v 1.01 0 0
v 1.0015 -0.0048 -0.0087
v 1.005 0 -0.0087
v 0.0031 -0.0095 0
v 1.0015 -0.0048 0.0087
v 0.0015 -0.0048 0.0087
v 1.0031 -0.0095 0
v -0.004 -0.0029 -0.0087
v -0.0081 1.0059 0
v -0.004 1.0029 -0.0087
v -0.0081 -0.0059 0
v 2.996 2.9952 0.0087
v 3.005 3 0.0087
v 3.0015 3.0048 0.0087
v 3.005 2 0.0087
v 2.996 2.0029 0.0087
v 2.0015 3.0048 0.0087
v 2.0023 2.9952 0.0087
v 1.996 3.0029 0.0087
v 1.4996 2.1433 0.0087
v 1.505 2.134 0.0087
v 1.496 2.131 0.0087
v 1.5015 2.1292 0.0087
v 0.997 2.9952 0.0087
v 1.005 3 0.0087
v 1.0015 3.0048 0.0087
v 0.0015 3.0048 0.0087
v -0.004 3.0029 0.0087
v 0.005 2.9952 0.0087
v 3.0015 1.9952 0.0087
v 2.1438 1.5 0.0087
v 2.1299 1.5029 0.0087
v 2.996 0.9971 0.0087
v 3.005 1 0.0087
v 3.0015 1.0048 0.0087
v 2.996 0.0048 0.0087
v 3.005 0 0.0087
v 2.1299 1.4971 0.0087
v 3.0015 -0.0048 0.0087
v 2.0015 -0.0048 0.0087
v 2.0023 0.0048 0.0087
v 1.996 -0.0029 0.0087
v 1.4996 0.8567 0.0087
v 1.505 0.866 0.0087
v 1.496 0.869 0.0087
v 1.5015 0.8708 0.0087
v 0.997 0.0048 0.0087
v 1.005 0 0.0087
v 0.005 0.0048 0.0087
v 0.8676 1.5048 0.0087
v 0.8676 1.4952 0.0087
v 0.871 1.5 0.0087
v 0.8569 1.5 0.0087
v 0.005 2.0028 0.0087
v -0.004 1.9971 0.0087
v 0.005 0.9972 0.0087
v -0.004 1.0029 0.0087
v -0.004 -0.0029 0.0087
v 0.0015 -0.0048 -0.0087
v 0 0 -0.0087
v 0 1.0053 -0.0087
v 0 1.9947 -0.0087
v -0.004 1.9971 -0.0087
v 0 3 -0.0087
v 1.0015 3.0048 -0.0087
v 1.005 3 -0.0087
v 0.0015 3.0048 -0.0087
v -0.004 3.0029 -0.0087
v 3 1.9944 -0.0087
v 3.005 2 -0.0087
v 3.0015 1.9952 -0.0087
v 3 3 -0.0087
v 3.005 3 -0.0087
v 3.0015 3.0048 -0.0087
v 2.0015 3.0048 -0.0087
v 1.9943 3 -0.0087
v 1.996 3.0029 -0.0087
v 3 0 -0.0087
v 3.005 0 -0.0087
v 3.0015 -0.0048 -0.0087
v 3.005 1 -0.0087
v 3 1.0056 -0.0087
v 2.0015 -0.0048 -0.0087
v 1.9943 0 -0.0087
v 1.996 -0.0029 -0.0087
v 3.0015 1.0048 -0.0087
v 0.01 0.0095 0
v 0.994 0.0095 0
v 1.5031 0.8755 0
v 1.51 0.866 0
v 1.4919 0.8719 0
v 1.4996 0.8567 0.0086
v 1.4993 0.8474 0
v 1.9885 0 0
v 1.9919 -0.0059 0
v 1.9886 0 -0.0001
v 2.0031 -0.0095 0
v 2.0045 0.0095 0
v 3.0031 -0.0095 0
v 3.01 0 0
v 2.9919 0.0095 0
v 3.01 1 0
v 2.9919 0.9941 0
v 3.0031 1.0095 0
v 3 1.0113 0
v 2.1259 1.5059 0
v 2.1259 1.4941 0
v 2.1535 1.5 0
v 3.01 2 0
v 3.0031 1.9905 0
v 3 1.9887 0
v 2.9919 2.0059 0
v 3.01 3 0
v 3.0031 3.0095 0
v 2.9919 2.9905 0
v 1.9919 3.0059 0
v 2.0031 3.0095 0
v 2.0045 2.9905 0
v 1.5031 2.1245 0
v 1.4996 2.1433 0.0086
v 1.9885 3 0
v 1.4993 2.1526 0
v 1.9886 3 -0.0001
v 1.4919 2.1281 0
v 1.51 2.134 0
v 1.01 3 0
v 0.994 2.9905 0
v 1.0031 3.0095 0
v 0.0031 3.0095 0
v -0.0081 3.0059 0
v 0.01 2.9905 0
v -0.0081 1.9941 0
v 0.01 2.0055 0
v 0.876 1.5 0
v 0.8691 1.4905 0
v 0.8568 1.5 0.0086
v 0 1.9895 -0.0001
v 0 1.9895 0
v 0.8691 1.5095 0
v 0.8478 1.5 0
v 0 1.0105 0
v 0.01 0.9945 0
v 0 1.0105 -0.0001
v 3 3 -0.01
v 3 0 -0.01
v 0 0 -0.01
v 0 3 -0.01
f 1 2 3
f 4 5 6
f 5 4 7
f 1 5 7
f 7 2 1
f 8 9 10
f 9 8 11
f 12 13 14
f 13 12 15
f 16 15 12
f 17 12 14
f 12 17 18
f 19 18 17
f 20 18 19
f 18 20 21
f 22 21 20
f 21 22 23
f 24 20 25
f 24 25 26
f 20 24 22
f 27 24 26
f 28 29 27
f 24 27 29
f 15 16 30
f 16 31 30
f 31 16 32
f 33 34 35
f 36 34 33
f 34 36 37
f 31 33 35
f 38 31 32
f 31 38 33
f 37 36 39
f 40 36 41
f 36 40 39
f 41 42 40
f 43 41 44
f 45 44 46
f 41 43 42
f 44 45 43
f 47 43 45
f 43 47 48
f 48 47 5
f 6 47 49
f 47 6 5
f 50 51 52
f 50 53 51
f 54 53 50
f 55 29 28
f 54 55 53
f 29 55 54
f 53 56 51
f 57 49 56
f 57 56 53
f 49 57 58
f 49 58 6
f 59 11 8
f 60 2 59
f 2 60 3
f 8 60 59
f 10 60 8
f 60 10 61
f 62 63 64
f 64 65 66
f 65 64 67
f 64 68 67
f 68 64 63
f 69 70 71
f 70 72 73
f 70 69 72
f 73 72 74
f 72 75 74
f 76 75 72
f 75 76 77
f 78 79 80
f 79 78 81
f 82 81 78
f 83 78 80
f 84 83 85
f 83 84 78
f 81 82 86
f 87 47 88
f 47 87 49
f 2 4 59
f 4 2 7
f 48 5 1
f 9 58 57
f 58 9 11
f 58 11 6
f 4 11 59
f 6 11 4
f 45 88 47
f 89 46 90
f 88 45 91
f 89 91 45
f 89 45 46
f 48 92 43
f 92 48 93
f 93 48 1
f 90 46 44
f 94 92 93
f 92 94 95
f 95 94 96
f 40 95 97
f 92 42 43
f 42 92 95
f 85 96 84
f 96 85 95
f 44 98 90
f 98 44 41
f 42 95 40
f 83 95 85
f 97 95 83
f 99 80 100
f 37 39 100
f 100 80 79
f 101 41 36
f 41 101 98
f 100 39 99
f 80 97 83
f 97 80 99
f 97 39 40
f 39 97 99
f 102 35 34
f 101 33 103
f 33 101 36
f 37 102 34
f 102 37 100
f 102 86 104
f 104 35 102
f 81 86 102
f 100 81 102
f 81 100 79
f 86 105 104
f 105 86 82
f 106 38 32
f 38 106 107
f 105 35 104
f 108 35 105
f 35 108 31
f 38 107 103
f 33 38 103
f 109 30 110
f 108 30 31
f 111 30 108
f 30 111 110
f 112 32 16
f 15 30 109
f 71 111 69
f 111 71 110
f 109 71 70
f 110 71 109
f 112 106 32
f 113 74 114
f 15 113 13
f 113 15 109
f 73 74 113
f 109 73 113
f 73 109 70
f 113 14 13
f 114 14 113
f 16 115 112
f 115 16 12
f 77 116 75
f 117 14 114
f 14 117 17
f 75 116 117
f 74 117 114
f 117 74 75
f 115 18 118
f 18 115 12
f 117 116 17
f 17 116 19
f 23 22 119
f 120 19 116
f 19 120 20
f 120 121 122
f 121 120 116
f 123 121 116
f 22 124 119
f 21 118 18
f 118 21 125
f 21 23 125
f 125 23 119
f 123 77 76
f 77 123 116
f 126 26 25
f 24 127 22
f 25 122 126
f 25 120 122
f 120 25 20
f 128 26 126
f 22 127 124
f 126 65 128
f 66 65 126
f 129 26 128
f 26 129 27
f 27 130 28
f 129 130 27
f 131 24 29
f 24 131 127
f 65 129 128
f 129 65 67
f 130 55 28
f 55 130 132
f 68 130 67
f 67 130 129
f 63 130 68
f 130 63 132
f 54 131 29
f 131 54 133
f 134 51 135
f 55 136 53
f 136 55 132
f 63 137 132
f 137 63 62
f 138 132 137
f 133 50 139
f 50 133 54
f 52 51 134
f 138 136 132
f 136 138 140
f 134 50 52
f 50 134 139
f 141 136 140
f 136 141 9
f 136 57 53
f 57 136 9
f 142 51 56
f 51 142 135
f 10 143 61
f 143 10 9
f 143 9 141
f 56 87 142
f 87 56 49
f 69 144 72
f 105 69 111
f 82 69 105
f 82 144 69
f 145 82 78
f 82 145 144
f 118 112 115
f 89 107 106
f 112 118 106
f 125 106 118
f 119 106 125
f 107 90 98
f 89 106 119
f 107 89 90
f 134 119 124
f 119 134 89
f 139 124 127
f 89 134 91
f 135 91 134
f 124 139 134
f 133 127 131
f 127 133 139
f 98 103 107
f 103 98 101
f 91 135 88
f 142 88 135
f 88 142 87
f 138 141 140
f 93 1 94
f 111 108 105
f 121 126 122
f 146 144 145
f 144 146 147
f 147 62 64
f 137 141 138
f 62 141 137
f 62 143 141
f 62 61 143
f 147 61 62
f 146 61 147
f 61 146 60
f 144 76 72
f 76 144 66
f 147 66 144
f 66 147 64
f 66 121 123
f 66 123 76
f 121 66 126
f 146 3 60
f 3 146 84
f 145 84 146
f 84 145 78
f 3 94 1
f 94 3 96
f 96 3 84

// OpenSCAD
hull(){
    translate([0.0, 0.0]) sphere(0.01);
    translate([1.0, 0.0]) sphere(0.01);
}
hull(){
    translate([1.0, 0.0]) sphere(0.01);
    translate([1.5, 0.8660254037844386]) sphere(0.01);
}
hull(){
    translate([1.5, 0.8660254037844386]) sphere(0.01);
    translate([2.0, 0.0]) sphere(0.01);
}
hull(){
    translate([2.0, 0.0]) sphere(0.01);
    translate([3.0, 0.0]) sphere(0.01);
}
hull(){
    translate([3.0, 0.0]) sphere(0.01);
    translate([3.0, 1.0]) sphere(0.01);
}
hull(){
    translate([3.0, 1.0]) sphere(0.01);
    translate([2.133974596215561, 1.5]) sphere(0.01);
}
hull(){
    translate([2.133974596215561, 1.5]) sphere(0.01);
    translate([3.0, 2.0]) sphere(0.01);
}
hull(){
    translate([3.0, 2.0]) sphere(0.01);
    translate([3.0, 3.0]) sphere(0.01);
}
hull(){
    translate([3.0, 3.0]) sphere(0.01);
    translate([2.0, 3.0]) sphere(0.01);
}
hull(){
    translate([2.0, 3.0]) sphere(0.01);
    translate([1.5, 2.133974596215561]) sphere(0.01);
}
hull(){
    translate([1.5, 2.133974596215561]) sphere(0.01);
    translate([1.0, 3.0]) sphere(0.01);
}
hull(){
    translate([1.0, 3.0]) sphere(0.01);
    translate([0.0, 3.0]) sphere(0.01);
}
hull(){
    translate([0.0, 3.0]) sphere(0.01);
    translate([0.0, 2.0]) sphere(0.01);
}
hull(){
    translate([0.0, 2.0]) sphere(0.01);
    translate([0.8660254037844386, 1.5]) sphere(0.01);
}
hull(){
    translate([0.8660254037844386, 1.5]) sphere(0.01);
    translate([0.0, 1.0]) sphere(0.01);
}
hull(){
    translate([0.0, 1.0]) sphere(0.01);
    translate([0.0, 0.0]) sphere(0.01);
}
translate([0,0,-0.01]) color([0.1,0.1,0.1]) cube([3,3,0.01]);
